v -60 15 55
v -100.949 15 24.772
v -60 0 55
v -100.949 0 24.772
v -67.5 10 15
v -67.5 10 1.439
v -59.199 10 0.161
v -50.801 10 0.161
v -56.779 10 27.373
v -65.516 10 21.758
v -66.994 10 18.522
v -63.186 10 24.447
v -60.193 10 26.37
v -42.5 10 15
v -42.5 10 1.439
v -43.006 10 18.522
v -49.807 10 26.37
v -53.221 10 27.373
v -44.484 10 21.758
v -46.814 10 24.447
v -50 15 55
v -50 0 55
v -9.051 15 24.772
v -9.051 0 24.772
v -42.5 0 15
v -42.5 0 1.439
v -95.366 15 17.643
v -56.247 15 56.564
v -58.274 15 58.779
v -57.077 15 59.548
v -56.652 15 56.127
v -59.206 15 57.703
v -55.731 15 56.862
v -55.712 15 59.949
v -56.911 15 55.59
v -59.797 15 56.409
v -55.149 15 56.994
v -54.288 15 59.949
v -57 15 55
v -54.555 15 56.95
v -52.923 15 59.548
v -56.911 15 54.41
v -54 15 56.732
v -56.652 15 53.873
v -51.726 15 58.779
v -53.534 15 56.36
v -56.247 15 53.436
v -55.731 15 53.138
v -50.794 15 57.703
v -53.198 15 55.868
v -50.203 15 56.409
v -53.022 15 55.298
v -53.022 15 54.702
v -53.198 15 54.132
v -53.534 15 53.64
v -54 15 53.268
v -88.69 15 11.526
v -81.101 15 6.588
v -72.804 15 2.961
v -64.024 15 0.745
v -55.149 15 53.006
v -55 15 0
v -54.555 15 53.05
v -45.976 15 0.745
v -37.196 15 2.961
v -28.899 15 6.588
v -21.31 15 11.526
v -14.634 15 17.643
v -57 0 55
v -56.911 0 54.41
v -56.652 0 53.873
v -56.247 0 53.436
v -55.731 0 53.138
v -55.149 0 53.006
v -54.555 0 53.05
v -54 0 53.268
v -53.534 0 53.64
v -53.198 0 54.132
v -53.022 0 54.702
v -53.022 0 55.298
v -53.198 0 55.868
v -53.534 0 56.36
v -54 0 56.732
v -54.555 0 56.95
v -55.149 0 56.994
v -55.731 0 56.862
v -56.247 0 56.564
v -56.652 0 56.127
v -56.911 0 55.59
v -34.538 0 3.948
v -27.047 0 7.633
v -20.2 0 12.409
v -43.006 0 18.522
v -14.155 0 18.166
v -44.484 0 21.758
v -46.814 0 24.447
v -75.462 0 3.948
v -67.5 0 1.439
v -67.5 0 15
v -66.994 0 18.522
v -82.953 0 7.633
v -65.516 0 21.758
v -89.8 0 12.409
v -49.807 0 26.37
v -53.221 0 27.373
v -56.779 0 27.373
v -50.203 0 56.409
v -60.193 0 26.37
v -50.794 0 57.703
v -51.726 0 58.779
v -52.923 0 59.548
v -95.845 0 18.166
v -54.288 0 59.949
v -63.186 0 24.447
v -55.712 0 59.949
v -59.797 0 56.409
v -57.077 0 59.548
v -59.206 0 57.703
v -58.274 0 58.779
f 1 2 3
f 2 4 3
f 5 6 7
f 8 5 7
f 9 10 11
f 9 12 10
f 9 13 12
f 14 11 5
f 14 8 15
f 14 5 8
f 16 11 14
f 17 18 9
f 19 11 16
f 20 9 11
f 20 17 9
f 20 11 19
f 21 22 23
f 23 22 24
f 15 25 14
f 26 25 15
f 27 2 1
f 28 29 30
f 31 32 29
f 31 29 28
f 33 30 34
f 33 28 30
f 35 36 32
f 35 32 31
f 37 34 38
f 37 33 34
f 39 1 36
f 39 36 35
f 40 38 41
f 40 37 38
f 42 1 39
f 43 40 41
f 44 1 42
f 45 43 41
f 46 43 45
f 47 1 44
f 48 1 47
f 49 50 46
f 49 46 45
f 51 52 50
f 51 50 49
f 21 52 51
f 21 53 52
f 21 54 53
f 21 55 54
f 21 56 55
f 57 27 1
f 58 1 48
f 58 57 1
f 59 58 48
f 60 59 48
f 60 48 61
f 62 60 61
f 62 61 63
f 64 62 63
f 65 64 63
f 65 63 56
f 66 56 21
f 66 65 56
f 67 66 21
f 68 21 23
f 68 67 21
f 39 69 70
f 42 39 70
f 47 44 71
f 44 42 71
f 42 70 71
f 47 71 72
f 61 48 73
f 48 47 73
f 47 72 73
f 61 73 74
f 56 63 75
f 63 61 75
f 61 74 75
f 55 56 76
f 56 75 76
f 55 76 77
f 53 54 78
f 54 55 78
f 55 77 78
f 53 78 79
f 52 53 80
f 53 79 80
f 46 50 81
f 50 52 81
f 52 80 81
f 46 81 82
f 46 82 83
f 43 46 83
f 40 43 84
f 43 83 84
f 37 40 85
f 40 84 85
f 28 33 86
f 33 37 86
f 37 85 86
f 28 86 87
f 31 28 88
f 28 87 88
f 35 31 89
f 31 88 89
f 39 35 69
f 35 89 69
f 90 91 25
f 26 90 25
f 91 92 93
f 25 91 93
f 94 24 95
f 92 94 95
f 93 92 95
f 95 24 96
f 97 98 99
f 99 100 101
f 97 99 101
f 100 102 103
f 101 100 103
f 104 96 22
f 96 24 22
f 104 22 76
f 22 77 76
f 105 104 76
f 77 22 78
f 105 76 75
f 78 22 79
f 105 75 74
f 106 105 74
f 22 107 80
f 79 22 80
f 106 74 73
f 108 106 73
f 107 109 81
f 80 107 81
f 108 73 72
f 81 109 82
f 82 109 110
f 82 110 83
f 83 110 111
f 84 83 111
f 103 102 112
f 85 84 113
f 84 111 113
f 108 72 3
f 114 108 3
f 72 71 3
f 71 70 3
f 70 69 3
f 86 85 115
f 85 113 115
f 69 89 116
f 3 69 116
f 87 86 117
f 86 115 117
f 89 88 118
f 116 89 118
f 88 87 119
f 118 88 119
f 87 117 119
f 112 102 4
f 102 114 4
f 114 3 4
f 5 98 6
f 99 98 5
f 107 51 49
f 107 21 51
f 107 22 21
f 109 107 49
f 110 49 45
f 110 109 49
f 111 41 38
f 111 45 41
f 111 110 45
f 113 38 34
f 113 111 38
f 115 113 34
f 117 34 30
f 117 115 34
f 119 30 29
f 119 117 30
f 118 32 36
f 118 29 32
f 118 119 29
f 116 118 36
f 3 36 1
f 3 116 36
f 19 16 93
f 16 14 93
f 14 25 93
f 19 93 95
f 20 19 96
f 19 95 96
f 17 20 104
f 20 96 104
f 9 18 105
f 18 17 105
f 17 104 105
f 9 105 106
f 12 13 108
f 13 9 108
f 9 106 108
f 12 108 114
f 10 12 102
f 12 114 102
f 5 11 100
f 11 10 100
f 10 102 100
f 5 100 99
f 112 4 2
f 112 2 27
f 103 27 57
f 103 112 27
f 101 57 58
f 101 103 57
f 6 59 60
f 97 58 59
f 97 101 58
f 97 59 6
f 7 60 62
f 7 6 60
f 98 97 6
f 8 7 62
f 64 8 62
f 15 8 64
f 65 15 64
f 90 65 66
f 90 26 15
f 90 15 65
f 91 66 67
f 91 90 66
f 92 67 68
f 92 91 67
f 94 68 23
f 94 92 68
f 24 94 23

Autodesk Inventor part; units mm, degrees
ref_plane "YZ Plane" through (0, 0, 0) normal (1, 0, 0) x (0, 1, 0)
ref_plane "XZ Plane" through (0, 0, 0) normal (0, 1, 0) x (-1, 0, 0)
ref_plane "XY Plane" through (0, 0, 0) normal (0, 0, 1) x (1, 0, 0)
sketch "スケッチ1" plane through (0, 0, 0) normal (0, 1, 0) x (-1, 0, 0)
  arc A0 (9.0513, 24.7723) -> (100.9487, 24.7723) centre (55, 55) ccw
  circle A1 centre (55, 15) radius 12.5
  arc A2 (60, 55) -> (50, 55) centre (55, 55) ccw
  circle A3 centre (55, 55) radius 2
  arc A4 (9.0513, 24.7723) -> (100.9487, 24.7723) centre (55, 55) ccw
  line L0 (100.9487, 24.7723) -> (60, 55)
  line L1 (50, 55) -> (9.0513, 24.7723)
  circle A5 centre (55, 55) radius 5
  arc A6 (60, 55) -> (50, 55) centre (55, 55) ccw
  point P0 (0, 0)
extrude "押し出し1" add sketch "スケッチ1" along normal blind 15
sketch "スケッチ2" plane through (0, 15, 0) normal (0, 1, 0) x (1, 0, 0)
  circle A0 centre (-55, -15) radius 12.5 projected
  circle A1 centre (-55, -15) radius 12.5
  point P0 (0, 0)
extrude "押し出し2" add sketch "スケッチ2" against normal blind 5
sketch "スケッチ3" plane through (0, 0, 0) normal (0, -1, 0) x (1, 0, 0)
  circle A0 centre (-55, 15) radius 12.5 projected
  line L0 (-67.5, 15) -> (-42.5, 15)
  line L1 (-42.5, 15) -> (-42.5, -1.7653)
  line L2 (-42.5, -1.7653) -> (-67.5, -1.7653)
  line L3 (-67.5, -1.7653) -> (-67.5, 15)
  point P0 (0, 0)
extrude "押し出し3" cut sketch "スケッチ3" against normal blind 10 contours L1 L2 L3 A0 | A0 L0 picked at (-57.3669, 11.5709)
properties part number "R_kit_test"
